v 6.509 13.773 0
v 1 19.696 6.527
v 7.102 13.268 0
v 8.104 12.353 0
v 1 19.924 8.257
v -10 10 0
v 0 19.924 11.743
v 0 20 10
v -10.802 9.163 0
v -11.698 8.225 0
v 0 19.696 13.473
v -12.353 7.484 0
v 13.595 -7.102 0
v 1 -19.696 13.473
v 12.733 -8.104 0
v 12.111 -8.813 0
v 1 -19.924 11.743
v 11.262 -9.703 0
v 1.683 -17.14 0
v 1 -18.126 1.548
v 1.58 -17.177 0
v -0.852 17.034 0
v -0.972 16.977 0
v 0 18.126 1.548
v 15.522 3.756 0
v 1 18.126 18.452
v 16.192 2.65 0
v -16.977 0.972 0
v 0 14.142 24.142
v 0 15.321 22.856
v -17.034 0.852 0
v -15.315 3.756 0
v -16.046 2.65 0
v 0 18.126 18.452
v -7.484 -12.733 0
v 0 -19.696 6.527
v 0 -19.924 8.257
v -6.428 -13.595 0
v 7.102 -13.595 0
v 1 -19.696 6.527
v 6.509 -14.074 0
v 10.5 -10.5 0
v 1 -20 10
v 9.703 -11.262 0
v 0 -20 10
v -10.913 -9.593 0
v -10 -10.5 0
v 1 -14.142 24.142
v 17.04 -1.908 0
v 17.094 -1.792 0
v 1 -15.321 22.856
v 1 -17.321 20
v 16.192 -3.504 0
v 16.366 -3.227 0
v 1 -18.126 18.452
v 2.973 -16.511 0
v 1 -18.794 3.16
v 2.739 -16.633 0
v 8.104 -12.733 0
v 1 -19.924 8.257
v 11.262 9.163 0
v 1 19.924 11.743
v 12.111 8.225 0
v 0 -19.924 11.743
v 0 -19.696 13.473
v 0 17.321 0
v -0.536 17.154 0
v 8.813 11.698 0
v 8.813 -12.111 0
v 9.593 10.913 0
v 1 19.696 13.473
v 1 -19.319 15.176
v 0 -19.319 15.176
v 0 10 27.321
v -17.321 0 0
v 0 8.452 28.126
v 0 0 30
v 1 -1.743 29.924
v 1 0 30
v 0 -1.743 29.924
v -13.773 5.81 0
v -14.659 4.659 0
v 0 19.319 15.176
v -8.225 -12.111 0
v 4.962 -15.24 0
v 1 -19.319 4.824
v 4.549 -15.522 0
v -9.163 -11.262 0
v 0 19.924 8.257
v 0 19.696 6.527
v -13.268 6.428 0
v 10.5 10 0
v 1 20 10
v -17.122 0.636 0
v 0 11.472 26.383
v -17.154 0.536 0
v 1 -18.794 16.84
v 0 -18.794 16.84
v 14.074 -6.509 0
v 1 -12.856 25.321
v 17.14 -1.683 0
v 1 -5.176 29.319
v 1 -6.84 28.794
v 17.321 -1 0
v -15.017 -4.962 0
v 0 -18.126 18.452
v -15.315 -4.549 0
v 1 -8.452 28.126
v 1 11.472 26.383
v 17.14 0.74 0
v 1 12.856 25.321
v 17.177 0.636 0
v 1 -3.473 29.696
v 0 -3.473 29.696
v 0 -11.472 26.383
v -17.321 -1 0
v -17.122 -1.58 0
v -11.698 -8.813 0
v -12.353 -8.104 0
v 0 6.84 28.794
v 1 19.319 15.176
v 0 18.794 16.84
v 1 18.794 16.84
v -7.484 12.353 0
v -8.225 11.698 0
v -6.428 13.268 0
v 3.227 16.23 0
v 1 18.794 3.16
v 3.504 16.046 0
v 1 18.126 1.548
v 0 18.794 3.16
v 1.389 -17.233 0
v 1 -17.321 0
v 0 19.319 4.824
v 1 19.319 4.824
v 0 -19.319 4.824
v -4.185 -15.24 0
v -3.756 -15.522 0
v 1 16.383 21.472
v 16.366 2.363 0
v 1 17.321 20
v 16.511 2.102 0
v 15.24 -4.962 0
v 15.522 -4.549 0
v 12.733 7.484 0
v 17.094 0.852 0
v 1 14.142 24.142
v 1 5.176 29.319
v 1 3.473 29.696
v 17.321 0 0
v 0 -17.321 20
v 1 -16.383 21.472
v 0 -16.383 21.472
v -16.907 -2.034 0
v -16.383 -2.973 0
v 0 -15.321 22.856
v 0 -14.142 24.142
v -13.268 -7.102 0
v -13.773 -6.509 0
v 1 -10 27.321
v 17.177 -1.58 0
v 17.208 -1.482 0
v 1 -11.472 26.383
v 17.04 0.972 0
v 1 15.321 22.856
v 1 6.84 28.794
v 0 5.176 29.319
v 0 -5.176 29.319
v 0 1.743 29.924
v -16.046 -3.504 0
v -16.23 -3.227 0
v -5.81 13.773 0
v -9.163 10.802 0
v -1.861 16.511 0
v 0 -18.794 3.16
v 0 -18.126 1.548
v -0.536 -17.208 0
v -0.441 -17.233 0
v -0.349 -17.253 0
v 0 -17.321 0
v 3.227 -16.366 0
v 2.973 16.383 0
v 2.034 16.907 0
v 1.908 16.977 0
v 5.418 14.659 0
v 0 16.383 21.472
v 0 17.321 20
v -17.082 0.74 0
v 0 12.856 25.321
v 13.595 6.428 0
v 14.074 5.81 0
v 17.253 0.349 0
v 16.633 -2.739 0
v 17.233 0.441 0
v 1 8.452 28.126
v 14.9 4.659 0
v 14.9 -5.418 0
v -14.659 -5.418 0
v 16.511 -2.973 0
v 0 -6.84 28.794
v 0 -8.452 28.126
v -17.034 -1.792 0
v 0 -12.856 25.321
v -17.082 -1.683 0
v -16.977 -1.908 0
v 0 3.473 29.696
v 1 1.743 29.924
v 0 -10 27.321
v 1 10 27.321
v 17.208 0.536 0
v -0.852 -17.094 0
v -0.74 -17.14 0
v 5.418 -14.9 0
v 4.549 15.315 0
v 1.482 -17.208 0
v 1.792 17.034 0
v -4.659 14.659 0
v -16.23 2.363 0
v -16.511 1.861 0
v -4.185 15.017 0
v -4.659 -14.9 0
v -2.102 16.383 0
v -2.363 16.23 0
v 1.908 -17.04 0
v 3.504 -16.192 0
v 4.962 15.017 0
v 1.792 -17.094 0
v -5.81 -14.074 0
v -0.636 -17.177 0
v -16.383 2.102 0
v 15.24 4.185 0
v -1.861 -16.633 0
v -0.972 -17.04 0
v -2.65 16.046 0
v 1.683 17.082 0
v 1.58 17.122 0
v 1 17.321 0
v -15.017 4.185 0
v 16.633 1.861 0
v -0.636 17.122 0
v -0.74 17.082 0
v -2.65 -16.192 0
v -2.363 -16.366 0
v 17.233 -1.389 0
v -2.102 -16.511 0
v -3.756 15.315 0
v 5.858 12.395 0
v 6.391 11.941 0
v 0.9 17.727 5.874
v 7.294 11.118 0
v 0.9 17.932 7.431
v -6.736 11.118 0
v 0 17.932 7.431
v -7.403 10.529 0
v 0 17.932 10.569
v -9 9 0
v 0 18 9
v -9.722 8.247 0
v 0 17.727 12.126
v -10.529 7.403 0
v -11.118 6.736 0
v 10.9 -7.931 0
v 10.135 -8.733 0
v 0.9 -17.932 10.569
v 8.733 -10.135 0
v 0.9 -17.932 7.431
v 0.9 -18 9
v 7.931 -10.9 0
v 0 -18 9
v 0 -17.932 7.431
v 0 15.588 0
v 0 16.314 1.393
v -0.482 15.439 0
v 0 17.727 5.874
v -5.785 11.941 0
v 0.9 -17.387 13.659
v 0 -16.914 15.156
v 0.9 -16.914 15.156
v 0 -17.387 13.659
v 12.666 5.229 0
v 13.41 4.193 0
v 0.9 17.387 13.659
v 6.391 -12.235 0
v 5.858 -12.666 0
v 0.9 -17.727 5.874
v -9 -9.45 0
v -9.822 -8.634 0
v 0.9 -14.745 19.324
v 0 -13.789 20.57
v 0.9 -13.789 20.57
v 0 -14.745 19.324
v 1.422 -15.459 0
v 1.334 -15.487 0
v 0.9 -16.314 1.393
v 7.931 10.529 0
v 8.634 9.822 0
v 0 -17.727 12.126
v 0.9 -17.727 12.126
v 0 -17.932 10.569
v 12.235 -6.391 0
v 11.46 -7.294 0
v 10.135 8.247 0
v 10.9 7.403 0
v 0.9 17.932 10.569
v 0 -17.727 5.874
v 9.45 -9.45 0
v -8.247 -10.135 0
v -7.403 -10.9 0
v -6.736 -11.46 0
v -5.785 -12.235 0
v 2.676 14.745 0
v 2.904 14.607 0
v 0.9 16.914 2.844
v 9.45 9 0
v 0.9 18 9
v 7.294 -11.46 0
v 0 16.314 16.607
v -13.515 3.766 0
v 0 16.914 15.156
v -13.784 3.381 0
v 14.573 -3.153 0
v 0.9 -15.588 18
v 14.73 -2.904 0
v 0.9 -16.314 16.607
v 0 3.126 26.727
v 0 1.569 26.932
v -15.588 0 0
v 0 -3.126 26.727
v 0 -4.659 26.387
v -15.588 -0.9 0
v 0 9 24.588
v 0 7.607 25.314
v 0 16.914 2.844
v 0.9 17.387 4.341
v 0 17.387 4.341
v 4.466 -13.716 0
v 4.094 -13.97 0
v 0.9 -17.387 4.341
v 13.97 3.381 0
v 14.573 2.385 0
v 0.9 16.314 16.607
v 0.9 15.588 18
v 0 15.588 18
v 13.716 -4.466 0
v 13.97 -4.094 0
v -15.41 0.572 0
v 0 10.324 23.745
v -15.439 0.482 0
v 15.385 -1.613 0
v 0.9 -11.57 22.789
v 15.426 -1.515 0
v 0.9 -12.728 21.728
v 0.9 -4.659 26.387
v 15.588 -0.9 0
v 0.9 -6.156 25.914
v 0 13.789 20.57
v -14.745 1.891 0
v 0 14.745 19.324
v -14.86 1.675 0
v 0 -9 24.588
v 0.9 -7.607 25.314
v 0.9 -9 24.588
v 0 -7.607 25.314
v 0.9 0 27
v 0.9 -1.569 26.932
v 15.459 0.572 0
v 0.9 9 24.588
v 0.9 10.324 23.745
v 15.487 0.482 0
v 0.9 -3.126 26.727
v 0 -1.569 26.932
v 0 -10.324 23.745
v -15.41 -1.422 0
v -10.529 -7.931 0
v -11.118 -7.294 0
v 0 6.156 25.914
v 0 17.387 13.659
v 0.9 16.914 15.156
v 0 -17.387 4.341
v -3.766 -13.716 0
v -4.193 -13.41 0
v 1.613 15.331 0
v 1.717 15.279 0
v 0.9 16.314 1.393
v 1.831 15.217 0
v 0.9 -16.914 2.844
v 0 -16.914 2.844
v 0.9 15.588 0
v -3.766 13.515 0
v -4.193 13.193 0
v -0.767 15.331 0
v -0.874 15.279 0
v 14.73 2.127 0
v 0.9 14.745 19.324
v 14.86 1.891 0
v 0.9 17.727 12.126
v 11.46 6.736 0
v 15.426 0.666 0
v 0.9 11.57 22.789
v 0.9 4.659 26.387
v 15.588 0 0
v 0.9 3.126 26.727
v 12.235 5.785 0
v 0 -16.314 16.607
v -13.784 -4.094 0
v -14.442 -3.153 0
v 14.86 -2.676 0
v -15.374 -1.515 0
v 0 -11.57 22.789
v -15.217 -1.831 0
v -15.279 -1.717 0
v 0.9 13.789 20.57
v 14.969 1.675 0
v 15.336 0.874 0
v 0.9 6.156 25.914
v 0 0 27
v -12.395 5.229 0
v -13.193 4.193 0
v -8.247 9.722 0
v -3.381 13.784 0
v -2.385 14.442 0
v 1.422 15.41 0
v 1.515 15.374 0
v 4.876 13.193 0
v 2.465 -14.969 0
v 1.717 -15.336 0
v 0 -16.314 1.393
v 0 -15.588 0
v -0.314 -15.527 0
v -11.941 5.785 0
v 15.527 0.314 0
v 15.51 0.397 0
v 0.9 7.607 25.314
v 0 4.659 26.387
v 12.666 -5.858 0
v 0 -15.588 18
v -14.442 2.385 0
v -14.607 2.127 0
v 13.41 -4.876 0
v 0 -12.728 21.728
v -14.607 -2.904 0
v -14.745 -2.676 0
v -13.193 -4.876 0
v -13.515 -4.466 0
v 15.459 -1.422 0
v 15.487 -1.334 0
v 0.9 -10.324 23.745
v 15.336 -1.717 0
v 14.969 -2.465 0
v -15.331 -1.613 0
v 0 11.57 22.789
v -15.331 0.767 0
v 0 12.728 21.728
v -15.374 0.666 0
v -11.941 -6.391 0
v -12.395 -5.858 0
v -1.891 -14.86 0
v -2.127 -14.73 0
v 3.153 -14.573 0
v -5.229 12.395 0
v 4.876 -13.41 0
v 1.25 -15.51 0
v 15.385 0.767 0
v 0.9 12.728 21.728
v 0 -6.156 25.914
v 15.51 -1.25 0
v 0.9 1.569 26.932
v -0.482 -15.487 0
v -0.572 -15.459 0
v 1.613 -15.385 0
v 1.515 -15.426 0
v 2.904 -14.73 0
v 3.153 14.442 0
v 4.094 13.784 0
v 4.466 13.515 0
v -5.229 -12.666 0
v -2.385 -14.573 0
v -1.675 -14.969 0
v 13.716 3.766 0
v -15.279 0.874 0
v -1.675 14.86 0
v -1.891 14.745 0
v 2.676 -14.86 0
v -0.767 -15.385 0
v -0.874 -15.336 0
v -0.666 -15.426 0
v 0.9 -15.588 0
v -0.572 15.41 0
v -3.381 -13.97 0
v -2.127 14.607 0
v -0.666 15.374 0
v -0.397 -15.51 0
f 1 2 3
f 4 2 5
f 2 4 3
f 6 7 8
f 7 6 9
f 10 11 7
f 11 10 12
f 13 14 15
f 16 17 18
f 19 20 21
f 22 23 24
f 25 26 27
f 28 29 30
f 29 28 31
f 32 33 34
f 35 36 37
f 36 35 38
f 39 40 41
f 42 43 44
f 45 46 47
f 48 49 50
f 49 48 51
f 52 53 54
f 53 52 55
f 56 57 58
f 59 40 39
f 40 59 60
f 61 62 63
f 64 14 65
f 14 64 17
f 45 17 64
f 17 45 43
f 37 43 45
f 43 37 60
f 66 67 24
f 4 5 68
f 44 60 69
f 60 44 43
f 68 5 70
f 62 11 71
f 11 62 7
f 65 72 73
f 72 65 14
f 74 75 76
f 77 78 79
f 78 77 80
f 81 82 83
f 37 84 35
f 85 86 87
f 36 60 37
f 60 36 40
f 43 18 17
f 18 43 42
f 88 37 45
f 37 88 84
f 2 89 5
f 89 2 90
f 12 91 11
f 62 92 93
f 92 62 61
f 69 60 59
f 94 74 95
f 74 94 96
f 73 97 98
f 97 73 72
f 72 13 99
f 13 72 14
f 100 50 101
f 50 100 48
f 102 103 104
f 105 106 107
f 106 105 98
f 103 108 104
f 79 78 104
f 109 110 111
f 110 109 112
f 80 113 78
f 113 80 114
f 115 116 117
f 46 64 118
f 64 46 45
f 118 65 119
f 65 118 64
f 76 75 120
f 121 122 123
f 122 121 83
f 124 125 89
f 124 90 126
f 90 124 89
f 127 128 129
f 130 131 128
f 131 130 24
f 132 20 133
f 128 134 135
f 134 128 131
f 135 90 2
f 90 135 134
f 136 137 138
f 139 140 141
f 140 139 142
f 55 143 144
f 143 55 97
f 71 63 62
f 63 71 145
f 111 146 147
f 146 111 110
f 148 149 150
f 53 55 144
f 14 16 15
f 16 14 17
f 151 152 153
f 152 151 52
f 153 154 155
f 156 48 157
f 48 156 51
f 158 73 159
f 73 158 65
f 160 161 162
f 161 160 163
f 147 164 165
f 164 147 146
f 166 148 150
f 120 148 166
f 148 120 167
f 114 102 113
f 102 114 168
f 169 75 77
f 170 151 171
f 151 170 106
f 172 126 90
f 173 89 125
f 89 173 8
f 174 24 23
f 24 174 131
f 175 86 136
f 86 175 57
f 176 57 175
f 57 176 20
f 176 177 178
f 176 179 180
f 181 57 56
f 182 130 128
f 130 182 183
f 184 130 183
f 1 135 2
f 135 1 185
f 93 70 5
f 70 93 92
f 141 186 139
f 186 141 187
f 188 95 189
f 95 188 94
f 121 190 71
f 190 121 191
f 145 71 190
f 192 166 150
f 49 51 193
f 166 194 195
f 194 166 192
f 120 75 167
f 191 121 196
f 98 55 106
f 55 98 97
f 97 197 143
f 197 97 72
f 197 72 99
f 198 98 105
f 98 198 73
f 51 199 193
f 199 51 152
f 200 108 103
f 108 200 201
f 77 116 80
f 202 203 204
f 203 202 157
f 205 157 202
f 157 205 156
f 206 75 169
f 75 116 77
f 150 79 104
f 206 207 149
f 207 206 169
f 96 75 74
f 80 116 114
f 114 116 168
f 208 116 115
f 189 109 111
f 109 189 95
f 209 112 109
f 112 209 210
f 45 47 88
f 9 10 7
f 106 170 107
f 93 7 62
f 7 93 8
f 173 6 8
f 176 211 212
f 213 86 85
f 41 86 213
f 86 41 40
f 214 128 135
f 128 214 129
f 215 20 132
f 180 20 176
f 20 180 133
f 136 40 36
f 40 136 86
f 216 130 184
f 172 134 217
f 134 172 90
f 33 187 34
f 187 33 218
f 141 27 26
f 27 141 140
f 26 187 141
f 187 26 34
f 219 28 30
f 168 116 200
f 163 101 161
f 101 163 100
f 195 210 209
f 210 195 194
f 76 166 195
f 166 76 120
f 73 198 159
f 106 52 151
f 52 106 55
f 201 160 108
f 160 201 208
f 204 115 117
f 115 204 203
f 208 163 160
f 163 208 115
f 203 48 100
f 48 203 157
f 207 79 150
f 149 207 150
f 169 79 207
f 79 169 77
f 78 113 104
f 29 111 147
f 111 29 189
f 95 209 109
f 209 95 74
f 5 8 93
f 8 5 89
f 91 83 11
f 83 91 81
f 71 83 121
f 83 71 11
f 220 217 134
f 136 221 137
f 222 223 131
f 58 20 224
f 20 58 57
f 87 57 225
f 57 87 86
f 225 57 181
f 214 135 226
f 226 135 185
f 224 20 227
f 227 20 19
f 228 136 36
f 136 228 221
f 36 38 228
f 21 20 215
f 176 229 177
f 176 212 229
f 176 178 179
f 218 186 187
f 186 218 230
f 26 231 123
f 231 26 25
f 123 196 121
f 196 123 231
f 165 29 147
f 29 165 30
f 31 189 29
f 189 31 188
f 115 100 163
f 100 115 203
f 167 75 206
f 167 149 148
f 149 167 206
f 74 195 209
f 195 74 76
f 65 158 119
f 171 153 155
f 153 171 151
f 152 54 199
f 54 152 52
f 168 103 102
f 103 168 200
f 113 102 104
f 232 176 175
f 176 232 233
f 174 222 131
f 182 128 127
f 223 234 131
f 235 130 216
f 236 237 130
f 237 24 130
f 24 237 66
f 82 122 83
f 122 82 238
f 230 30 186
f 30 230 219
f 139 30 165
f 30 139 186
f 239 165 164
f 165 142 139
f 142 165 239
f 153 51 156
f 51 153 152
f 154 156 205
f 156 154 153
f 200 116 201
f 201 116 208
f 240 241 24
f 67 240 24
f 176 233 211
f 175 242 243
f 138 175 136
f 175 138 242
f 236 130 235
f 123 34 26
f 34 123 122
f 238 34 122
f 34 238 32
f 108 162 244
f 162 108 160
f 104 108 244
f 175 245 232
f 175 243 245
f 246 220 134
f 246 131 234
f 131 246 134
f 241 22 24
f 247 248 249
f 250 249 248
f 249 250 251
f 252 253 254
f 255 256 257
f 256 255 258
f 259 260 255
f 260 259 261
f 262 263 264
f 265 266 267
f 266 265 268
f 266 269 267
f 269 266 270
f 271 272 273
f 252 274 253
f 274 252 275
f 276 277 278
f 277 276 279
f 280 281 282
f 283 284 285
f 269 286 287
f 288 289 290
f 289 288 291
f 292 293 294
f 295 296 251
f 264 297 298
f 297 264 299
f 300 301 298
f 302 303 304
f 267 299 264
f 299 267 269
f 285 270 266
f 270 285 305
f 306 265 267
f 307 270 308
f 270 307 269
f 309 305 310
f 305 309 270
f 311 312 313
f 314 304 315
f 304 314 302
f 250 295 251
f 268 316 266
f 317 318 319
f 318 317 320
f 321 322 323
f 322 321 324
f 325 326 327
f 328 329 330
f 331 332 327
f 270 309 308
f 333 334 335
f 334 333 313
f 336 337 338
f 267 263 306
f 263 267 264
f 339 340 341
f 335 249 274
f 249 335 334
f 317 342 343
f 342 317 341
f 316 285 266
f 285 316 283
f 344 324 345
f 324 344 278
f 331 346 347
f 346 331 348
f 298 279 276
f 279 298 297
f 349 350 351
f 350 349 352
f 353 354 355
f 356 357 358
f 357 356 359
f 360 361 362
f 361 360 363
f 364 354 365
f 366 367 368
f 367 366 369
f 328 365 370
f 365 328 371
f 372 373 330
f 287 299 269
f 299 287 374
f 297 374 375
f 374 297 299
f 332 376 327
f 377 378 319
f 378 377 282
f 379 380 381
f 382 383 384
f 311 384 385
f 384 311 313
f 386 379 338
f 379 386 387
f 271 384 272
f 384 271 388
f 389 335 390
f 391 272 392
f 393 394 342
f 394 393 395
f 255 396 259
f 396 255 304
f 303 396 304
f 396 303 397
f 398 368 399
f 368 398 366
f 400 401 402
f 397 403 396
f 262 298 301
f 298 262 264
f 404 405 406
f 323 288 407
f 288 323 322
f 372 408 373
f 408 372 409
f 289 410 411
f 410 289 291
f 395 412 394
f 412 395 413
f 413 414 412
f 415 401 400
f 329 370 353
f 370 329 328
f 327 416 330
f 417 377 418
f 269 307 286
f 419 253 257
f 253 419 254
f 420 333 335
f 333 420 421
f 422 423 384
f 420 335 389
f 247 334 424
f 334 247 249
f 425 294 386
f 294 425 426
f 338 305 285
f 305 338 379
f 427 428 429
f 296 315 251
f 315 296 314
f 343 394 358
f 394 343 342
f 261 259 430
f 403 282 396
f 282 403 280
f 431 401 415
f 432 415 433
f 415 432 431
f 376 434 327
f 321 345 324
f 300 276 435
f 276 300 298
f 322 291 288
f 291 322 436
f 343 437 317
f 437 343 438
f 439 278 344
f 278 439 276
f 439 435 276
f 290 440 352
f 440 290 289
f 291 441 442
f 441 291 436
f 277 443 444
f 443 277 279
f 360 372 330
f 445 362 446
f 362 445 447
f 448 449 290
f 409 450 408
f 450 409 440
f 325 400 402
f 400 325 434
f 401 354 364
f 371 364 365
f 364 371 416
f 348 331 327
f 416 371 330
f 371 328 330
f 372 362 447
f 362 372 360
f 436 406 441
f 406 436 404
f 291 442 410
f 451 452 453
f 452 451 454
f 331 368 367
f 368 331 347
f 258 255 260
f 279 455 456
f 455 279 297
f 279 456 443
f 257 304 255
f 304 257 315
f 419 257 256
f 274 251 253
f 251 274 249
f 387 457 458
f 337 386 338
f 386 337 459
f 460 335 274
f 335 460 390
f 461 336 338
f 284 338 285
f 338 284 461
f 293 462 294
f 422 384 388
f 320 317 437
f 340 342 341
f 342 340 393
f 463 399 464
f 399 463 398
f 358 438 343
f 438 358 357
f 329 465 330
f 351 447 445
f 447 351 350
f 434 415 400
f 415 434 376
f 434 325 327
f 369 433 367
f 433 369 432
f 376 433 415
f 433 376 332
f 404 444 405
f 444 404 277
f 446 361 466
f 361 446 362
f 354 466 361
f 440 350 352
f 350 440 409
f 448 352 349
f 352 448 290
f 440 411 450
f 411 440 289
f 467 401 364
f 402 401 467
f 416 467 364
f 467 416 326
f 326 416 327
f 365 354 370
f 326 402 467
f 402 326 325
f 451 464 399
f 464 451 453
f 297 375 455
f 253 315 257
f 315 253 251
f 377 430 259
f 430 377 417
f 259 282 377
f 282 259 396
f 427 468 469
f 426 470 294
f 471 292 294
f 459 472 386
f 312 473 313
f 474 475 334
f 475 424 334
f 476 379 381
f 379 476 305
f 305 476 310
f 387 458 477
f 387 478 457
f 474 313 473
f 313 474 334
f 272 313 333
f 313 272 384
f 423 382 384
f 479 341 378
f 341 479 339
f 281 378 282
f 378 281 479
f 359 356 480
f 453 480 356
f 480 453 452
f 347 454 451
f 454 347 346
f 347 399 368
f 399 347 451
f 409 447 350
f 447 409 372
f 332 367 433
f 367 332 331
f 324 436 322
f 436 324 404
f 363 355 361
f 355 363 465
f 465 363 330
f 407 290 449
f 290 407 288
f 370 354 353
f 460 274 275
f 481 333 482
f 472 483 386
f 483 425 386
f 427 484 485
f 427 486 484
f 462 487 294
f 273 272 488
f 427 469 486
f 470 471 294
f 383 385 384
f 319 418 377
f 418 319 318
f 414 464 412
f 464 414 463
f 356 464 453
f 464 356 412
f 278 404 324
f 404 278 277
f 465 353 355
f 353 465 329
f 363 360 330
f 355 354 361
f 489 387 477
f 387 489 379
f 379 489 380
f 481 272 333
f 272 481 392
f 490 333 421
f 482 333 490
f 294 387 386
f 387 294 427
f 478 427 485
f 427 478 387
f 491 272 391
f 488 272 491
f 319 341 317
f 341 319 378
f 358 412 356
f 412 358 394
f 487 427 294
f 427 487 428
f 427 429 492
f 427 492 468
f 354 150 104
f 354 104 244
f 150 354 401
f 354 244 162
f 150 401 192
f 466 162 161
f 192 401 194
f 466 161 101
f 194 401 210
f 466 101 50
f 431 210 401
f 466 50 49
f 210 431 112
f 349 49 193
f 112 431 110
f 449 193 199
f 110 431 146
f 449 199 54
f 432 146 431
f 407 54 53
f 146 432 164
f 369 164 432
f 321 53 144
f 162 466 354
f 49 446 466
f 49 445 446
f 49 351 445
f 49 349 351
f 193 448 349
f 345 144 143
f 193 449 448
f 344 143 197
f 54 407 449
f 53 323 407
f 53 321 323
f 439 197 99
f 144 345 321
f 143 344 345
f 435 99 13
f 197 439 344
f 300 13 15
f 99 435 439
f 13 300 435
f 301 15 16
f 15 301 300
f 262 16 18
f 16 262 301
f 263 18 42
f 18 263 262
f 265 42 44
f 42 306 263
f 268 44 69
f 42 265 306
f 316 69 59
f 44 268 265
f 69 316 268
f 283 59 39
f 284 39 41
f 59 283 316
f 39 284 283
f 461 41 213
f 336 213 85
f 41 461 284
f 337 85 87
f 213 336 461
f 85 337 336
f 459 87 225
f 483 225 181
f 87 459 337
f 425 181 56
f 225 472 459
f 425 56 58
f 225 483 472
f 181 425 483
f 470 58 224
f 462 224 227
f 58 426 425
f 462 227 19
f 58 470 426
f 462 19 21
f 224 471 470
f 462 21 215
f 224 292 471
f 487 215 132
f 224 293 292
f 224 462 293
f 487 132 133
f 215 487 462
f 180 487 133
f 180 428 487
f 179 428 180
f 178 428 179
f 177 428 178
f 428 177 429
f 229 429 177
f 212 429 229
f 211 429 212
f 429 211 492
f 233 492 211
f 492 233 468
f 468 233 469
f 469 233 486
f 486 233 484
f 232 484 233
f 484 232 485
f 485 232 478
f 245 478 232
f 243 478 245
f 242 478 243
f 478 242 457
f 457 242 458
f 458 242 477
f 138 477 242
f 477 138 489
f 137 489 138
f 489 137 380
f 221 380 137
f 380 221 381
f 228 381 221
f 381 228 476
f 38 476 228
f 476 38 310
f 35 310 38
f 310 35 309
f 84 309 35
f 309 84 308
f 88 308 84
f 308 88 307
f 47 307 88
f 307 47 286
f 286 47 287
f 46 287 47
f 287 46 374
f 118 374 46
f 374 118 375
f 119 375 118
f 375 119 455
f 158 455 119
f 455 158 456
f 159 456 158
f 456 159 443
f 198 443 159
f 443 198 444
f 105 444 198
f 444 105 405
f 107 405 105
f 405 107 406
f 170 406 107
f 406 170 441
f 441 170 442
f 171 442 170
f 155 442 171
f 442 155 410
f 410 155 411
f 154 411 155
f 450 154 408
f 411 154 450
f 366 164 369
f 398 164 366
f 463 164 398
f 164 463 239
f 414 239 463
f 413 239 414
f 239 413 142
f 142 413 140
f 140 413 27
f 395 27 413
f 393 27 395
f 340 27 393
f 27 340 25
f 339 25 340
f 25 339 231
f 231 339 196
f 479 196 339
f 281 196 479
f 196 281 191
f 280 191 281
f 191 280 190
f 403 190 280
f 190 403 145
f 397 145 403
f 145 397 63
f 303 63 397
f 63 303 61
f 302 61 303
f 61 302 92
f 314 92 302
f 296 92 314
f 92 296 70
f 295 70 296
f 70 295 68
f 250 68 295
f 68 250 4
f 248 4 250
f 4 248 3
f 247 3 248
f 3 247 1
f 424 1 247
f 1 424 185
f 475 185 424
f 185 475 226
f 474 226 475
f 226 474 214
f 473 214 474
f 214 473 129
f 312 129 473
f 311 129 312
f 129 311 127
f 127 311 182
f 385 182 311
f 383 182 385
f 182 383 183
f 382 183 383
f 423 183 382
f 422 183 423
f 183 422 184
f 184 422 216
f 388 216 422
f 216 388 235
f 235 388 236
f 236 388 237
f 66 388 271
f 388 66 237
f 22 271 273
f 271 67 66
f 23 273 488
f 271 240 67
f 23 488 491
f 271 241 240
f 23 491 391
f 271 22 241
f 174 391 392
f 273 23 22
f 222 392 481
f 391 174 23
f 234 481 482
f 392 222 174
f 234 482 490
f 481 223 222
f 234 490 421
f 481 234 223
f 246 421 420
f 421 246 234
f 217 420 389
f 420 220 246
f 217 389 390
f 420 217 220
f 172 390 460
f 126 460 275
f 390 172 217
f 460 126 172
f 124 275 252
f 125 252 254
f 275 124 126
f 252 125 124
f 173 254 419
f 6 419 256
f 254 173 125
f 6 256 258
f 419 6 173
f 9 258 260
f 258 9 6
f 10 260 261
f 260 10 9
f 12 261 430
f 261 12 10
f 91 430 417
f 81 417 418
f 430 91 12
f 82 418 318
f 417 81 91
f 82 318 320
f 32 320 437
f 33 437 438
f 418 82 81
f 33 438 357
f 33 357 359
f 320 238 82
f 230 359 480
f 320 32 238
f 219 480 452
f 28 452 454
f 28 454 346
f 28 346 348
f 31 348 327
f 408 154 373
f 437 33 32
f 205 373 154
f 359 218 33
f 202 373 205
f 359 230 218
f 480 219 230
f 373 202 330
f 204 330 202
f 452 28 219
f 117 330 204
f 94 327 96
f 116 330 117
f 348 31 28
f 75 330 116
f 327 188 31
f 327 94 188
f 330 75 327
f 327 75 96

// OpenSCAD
//$fn=60;
$fa=5;
$fs=.4;

oScale = .9;

difference(){
    oloid();
    scale([oScale,oScale,oScale]) oloid();
    translate([0,0,-25]) cube(size=50,center=true);
}

module oloid(){
    rotate([0,90,0]) hull(){
        translate([-10,0,0]) start_shape();
        rotate([90,0,0]) translate([10,0,0]) start_shape();
    }
}

module start_shape(){
    linear_extrude(height=1){
        circle(d=40);
    }
}
